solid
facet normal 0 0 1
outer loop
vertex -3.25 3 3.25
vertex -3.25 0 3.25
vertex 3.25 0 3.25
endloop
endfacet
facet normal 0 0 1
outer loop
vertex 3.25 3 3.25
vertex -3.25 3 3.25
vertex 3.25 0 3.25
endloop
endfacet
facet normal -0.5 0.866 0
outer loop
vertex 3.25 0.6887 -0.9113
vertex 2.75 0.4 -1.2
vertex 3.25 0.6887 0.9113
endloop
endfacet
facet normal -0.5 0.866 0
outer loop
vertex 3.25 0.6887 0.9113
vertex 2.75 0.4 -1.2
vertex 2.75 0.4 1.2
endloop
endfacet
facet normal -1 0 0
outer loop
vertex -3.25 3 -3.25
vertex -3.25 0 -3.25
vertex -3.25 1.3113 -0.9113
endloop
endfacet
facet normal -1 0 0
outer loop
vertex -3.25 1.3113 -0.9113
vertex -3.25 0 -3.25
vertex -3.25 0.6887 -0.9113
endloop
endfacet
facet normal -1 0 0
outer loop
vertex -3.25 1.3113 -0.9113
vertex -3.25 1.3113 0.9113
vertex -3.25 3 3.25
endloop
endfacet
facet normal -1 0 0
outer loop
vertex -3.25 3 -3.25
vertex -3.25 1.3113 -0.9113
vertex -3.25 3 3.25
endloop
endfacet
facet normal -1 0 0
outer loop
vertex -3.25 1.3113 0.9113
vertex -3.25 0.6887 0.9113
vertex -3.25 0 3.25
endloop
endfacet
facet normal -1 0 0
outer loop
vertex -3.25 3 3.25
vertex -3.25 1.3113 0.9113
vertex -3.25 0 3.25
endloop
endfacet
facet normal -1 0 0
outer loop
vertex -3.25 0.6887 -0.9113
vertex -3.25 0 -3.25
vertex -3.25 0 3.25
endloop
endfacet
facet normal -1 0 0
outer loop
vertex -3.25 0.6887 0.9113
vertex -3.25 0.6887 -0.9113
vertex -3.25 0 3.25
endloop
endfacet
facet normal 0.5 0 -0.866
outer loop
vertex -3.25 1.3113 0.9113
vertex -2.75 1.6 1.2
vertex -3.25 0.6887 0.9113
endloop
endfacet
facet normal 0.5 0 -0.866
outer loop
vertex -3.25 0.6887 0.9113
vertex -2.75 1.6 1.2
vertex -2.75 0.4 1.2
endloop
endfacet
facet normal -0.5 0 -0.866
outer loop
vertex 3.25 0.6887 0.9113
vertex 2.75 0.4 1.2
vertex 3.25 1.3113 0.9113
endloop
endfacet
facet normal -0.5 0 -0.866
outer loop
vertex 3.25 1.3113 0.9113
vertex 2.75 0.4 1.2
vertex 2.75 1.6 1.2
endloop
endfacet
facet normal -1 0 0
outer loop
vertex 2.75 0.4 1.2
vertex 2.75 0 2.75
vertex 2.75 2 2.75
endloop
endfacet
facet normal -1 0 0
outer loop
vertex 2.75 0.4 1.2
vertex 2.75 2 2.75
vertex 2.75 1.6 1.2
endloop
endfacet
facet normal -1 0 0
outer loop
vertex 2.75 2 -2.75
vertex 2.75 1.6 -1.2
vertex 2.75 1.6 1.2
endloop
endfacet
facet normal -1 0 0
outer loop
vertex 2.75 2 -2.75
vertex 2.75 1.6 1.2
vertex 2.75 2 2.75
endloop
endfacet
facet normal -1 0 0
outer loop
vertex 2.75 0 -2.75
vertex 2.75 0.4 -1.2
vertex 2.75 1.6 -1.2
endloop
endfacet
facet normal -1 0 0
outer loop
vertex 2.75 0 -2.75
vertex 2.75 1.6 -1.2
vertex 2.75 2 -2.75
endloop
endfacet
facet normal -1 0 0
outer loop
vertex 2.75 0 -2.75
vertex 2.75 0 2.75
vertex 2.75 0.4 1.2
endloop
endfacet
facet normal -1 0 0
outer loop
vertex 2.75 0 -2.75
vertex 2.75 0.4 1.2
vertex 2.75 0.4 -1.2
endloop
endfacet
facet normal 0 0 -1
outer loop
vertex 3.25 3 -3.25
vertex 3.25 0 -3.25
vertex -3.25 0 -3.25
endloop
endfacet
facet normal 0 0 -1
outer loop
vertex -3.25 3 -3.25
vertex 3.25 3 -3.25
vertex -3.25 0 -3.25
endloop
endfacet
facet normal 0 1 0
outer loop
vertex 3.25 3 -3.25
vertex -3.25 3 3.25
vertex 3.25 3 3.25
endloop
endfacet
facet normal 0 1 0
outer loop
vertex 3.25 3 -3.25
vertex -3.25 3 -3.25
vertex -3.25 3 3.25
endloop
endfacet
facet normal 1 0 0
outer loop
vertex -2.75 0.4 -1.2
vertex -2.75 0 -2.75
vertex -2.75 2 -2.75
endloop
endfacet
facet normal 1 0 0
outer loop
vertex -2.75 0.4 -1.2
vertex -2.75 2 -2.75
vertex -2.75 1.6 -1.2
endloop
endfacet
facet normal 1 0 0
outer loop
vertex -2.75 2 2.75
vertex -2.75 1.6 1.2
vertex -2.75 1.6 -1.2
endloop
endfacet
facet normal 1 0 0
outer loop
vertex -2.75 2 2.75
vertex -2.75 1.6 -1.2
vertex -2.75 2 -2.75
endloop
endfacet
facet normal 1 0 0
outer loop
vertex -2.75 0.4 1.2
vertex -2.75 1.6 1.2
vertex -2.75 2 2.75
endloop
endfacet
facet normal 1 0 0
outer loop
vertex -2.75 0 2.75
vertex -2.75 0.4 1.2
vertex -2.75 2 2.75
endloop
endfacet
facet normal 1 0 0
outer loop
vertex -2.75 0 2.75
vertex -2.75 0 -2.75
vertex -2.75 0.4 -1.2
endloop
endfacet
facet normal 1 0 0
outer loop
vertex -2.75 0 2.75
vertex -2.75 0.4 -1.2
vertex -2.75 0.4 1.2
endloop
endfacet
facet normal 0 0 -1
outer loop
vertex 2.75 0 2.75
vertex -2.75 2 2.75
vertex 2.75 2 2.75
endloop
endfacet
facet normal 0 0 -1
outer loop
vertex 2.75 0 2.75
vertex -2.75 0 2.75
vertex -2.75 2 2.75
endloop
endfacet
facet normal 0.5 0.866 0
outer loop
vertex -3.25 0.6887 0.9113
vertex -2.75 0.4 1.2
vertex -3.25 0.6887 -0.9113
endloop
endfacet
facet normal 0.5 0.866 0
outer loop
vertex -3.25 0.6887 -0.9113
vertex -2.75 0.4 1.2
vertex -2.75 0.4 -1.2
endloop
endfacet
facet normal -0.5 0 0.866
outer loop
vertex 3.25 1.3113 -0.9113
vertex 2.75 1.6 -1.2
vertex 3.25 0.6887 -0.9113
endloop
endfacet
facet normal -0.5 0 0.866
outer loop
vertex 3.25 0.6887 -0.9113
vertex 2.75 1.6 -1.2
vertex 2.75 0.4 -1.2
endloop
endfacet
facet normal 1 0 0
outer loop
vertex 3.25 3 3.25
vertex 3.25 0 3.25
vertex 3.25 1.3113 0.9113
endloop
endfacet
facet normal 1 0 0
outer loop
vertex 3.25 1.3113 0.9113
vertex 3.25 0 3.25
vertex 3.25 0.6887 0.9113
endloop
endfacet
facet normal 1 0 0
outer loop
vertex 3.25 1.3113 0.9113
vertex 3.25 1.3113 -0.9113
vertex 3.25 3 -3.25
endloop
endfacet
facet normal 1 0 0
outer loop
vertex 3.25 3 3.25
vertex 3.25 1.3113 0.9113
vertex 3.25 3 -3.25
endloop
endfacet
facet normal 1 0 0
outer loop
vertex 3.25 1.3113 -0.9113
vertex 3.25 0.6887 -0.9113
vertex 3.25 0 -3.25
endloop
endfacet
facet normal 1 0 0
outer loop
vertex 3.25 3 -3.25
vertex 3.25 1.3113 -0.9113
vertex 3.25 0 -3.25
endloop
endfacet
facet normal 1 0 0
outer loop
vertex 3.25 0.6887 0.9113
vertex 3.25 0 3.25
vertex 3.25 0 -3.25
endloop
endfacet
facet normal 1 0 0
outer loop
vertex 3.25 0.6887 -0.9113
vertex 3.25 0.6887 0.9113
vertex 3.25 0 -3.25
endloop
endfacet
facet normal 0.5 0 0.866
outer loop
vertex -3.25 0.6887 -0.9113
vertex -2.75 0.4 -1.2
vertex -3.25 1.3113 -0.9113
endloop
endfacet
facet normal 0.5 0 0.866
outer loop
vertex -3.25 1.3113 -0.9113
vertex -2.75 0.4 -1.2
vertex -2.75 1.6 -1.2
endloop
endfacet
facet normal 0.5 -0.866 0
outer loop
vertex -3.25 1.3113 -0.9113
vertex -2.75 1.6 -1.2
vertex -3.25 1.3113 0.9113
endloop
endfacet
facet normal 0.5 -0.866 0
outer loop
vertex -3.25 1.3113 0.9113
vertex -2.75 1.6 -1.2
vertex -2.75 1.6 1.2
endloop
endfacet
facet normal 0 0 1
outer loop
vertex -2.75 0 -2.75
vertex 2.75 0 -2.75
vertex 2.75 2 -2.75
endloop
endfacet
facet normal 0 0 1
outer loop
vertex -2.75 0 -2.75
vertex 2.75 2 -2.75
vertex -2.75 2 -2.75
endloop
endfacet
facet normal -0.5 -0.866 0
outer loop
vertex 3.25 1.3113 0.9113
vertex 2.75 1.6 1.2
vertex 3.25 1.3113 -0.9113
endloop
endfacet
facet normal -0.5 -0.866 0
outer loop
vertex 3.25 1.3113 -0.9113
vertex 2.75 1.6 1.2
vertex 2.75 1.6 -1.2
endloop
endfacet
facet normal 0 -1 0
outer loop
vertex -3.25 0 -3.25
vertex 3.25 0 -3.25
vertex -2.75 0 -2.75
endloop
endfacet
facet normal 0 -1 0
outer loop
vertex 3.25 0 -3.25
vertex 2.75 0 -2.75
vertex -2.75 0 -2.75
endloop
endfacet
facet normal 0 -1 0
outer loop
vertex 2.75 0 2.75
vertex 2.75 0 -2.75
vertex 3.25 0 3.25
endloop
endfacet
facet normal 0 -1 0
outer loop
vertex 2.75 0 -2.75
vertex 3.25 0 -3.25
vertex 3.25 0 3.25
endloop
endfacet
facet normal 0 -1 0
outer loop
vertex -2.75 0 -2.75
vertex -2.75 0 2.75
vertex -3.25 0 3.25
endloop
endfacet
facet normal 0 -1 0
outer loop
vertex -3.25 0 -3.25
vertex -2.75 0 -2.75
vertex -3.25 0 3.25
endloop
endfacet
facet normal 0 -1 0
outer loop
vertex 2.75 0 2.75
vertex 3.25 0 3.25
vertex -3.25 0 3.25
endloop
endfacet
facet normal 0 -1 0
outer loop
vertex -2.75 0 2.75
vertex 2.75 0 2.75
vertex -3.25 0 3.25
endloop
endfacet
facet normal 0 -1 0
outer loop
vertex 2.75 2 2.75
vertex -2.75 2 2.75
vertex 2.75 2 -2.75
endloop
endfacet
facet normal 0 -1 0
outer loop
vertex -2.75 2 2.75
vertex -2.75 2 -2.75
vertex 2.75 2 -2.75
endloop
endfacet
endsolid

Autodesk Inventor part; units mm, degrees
ref_plane "YZ Plane" through (0, 0, 0) normal (1, 0, 0) x (0, 1, 0)
ref_plane "XZ Plane" through (0, 0, 0) normal (0, 1, 0) x (-1, 0, 0)
ref_plane "XY Plane" through (0, 0, 0) normal (0, 0, 1) x (1, 0, 0)
sketch "Sketch2" plane through (0, 0, 0) normal (0, 1, 0) x (-1, 0, 0)
  line L0 (-2.75, -2.75) -> (2.75, -2.75)
  line L1 (2.75, -2.75) -> (2.75, 2.75)
  line L2 (2.75, 2.75) -> (-2.75, 2.75)
  line L3 (-2.75, 2.75) -> (-2.75, -2.75)
  line L4 (-2.75, -2.75) -> (2.75, 2.75) construction
  line L5 (2.75, -2.75) -> (-2.75, 2.75) construction
  line L6 (3.25, 3.25) -> (-3.25, 3.25)
  line L7 (-3.25, 3.25) -> (-3.25, -3.25)
  line L8 (-3.25, -3.25) -> (3.25, -3.25)
  line L9 (3.25, -3.25) -> (3.25, 3.25)
  line L10 (3.25, 3.25) -> (-3.25, -3.25) construction
  line L11 (-3.25, 3.25) -> (3.25, -3.25) construction
  point P0 (0, 0)
  point P1 (3.25, 0)
  point P2 (-3.25, 0)
  point P3 (3.25, 0)
  point P4 (-3.25, 0)
  point P5 (3.25, 0)
  point P6 (2.75, 0)
  point P7 (-2.75, 0)
  dimension "d2" = 5.5
  dimension "d3" = 5.5
  dimension "d6" = 6.5
  dimension "d7" = 6.5
extrude "Extrusion1" add sketch "Sketch2" along normal blind 2
sketch "Sketch4" plane through (0, 2, 0) normal (0, 1, 0) x (1, 0, 0)
  line L0 (-3.25, 3.25) -> (-3.25, -3.25) projected
  line L1 (3.25, -3.25) -> (3.25, 3.25) projected
  line L2 (-3.25, -3.25) -> (3.25, -3.25)
  line L3 (3.25, -3.25) -> (3.25, 3.25)
  line L4 (3.25, 3.25) -> (-3.25, 3.25)
  line L5 (-3.25, 3.25) -> (-3.25, -3.25)
  point P0 (0, 0)
  dimension "d10" = 6.5
extrude "Extrusion2" add sketch "Sketch4" along normal blind 1
sketch "Sketch5" plane through (0, 0, 0) normal (0, -1, 0) x (1, 0, 0)
  line L0 (-3.25, -3.25) -> (-3.25, 3.25) projected
  line L1 (3.25, 3.25) -> (3.25, -3.25) projected
  point P0 (0, 0)
  point P1 (-3.25, 0)
  point P2 (3.25, 0)
sketch "Sketch6" plane through (2.75, 0, -2.75) normal (-1, 0, 0) x (0, 0, 1)
  line L0 (1.55, 0.4) -> (3.95, 0.4)
  line L1 (3.95, 0.4) -> (3.95, 1.6)
  line L2 (3.95, 1.6) -> (1.55, 1.6)
  line L3 (1.55, 1.6) -> (1.55, 0.4)
  line L4 (1.55, 0.4) -> (3.95, 1.6) construction
  line L5 (3.95, 0.4) -> (1.55, 1.6) construction
  line L6 (0, 2) -> (5.5, 2) projected
  point P0 (2.75, 0)
  point P1 (2.75, 1)
  dimension "d13" = 2.4
  dimension "d14" = 1.2
  dimension "d15" = 1
extrude "Extrusion3" cut sketch "Sketch6" against normal blind 0.5 draft -30
sketch "Sketch7" plane through (-2.75, 0, 2.75) normal (1, 0, 0) x (0, 0, -1)
  line L0 (1.55, 0.4) -> (3.95, 0.4)
  line L1 (3.95, 0.4) -> (3.95, 1.6)
  line L2 (3.95, 1.6) -> (1.55, 1.6)
  line L3 (1.55, 1.6) -> (1.55, 0.4)
  line L4 (1.55, 0.4) -> (3.95, 1.6) construction
  line L5 (3.95, 0.4) -> (1.55, 1.6) construction
  line L6 (0, 2) -> (5.5, 2) projected
  point P0 (2.75, 0)
  point P1 (2.75, 1)
  dimension "d18" = 2.4
  dimension "d19" = 1.2
  dimension "d20" = 1
extrude "Extrusion4" cut sketch "Sketch7" against normal blind 0.5 draft -30
properties part number "snapfit_lid_v07"
